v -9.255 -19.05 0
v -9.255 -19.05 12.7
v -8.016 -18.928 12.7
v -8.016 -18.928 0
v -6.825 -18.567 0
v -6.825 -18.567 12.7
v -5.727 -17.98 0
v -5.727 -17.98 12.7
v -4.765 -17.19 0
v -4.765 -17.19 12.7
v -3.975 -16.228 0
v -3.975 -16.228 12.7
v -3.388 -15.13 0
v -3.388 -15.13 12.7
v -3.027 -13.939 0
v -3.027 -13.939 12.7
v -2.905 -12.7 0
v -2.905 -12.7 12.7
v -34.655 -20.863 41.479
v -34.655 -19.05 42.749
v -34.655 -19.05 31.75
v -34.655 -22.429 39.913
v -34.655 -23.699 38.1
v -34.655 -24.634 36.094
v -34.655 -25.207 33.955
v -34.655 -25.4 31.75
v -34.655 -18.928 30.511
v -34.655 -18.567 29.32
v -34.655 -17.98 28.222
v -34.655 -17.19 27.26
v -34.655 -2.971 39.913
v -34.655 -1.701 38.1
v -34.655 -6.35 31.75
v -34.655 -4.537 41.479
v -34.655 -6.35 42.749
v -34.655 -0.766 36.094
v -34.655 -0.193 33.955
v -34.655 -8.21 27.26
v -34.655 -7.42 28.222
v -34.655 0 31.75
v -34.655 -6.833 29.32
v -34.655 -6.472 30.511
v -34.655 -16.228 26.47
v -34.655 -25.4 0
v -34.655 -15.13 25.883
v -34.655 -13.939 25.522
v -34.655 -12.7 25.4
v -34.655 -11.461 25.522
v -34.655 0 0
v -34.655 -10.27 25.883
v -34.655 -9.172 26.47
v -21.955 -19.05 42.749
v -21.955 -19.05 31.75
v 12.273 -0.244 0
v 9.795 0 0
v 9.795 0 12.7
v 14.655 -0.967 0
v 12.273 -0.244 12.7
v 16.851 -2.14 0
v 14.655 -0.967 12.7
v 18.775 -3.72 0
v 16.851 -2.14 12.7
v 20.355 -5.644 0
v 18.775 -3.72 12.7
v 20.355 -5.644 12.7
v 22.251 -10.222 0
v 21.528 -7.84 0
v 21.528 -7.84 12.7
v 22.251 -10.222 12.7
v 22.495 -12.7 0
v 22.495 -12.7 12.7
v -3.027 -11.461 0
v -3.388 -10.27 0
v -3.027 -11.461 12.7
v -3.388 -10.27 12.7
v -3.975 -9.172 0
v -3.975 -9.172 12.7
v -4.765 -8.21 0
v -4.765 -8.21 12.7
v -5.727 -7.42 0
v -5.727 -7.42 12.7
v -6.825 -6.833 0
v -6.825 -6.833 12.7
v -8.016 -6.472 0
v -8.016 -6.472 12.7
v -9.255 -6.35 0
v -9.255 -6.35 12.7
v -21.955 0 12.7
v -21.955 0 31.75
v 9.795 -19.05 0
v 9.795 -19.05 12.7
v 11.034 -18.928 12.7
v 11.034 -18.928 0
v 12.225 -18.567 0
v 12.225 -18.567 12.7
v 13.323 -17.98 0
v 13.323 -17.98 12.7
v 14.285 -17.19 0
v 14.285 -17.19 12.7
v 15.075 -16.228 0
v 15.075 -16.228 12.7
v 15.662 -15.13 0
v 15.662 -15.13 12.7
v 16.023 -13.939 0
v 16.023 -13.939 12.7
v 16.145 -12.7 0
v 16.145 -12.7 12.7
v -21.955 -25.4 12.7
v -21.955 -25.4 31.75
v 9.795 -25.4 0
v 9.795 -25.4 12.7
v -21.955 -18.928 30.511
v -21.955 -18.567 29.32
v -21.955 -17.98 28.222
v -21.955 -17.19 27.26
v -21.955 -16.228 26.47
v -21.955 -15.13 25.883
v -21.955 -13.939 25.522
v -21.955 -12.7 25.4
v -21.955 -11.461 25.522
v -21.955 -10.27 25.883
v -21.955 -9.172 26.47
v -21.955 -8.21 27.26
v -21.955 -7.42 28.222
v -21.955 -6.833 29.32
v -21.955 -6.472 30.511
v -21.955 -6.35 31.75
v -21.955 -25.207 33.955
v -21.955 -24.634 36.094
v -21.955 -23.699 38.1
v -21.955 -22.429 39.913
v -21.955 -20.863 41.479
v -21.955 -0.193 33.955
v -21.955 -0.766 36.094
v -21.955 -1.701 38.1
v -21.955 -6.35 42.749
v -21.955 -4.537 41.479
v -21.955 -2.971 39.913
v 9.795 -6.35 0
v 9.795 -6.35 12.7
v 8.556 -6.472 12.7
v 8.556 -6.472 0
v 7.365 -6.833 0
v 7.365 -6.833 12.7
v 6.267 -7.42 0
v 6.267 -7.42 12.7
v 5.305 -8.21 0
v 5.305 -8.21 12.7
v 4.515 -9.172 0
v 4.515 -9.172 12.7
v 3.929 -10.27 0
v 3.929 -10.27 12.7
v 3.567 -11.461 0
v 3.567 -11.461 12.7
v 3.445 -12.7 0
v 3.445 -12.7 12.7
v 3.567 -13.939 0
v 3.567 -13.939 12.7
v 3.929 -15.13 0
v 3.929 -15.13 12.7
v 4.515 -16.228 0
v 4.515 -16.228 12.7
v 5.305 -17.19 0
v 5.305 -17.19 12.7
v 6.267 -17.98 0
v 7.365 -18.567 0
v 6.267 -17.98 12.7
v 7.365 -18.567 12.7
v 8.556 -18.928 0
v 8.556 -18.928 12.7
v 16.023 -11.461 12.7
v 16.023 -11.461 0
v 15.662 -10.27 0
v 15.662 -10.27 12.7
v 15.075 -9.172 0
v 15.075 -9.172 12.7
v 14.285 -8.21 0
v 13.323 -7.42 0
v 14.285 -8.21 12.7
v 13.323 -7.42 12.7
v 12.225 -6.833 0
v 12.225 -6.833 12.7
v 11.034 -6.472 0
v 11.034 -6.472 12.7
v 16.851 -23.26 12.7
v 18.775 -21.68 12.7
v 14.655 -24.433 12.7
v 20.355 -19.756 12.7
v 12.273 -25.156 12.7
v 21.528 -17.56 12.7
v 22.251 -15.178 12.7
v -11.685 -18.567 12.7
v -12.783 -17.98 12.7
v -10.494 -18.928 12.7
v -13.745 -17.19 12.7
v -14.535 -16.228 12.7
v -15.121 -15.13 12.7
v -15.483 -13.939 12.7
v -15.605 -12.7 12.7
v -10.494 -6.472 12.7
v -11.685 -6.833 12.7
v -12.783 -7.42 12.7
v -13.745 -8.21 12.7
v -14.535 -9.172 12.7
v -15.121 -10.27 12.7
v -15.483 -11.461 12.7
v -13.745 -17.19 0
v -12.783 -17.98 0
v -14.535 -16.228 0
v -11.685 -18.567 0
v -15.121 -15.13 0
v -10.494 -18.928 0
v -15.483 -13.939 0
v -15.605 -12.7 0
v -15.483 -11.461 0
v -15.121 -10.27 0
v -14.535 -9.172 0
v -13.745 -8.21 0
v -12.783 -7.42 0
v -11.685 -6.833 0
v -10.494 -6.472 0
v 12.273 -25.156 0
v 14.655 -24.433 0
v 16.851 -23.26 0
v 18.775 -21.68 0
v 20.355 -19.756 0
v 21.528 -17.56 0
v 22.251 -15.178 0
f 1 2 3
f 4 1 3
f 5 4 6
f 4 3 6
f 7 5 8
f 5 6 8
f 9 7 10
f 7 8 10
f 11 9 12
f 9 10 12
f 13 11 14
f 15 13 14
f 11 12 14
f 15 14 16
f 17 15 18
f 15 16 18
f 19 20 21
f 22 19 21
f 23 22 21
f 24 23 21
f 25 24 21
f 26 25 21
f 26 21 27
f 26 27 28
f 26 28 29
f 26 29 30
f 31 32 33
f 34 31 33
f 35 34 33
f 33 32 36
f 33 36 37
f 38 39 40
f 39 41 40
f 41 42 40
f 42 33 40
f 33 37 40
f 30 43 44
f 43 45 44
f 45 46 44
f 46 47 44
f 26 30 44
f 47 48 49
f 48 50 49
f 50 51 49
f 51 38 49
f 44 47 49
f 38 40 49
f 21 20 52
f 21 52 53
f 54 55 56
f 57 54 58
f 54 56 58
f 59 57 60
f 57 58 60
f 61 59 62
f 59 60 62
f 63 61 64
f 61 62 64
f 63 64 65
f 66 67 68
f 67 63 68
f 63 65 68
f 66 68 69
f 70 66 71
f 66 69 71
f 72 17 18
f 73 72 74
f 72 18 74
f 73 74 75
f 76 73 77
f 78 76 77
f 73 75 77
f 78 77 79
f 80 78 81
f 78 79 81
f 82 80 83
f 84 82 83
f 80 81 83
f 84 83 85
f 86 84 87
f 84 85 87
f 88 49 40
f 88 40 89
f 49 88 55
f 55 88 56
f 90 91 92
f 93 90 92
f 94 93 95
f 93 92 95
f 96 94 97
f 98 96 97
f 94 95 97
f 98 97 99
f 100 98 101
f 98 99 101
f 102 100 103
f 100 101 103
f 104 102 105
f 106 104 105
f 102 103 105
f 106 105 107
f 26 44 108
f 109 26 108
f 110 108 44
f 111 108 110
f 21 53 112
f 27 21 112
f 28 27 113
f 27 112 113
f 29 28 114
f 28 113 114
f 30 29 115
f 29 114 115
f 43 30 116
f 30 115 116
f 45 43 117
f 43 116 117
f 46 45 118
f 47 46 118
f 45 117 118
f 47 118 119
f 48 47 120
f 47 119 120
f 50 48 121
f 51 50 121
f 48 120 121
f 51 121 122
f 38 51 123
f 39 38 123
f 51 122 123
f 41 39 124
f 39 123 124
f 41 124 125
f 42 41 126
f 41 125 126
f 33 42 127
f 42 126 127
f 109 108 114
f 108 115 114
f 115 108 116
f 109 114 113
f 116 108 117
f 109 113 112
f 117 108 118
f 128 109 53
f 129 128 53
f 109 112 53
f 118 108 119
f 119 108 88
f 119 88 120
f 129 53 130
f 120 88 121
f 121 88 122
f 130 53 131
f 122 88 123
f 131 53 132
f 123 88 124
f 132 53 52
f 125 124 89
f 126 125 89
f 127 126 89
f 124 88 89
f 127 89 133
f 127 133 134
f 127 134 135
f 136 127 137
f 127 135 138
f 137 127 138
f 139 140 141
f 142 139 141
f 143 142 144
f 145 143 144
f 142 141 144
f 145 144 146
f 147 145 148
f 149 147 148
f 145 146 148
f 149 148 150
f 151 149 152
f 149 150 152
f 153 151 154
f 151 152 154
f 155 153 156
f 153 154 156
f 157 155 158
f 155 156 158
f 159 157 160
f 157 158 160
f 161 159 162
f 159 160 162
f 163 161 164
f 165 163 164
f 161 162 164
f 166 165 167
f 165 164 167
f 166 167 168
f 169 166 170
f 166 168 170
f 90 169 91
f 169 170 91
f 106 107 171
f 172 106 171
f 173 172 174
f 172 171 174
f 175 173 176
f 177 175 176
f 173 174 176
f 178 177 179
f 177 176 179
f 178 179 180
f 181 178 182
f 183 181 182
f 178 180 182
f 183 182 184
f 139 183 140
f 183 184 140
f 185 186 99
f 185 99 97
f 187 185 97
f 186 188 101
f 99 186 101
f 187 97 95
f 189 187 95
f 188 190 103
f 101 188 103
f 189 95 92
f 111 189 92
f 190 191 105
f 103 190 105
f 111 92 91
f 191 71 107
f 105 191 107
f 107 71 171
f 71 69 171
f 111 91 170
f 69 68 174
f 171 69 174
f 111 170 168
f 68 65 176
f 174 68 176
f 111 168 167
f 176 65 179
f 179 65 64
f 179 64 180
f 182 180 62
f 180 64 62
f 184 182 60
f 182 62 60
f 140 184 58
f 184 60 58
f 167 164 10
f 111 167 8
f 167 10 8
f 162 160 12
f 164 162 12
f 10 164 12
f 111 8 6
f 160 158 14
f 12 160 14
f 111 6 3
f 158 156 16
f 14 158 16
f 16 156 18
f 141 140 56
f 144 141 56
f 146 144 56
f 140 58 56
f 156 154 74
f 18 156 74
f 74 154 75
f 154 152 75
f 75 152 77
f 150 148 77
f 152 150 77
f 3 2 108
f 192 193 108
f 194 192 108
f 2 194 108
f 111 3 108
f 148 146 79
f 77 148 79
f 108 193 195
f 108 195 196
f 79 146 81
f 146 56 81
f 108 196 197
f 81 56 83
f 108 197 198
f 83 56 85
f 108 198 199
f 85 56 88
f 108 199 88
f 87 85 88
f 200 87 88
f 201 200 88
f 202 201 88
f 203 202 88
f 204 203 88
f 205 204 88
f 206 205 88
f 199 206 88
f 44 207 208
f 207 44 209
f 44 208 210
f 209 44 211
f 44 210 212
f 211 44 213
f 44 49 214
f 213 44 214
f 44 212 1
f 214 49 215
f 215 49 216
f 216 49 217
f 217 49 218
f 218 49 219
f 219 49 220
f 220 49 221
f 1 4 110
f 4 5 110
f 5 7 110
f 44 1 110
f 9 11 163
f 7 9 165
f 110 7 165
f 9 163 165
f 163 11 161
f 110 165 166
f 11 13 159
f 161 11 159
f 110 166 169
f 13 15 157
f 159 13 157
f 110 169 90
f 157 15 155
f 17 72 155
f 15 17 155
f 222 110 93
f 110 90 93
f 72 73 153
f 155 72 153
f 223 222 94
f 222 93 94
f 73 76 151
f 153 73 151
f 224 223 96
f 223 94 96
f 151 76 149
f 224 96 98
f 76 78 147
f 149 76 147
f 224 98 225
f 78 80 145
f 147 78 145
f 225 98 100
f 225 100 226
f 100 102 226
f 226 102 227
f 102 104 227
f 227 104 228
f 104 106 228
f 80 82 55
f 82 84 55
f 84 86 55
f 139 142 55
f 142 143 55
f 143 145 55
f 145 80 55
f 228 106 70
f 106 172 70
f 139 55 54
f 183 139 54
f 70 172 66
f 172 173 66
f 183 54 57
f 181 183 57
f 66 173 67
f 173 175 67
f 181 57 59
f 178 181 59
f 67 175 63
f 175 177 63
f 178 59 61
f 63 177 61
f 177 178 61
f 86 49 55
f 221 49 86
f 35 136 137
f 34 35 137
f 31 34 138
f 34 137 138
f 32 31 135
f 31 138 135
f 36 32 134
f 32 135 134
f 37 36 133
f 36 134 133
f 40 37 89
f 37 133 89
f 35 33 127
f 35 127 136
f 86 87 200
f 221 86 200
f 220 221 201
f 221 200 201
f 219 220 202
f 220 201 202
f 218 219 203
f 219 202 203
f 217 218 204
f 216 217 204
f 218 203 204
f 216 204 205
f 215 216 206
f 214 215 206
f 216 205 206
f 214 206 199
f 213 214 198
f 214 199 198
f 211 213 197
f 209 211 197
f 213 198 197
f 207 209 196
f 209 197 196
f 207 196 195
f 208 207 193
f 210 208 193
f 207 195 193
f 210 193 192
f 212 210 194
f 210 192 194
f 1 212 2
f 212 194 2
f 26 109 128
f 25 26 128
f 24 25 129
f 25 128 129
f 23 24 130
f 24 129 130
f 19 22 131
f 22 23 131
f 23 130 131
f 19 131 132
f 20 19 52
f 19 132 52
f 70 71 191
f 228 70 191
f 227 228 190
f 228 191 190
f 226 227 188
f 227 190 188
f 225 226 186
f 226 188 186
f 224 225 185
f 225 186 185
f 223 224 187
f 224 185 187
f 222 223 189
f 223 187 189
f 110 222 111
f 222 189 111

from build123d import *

# Parameters (mm, degrees)
F1_DEPTH = 25.4
F3_DEPTH = 12.701
F5_DEPTH = 12.701


with BuildPart() as f1:
    # F0 (on Front) → F1 (new body)
    with BuildSketch(Plane.XZ):
        Polygon((-34.6547834919, 44.45), (-34.6547834919, 0), (22.4952165081, 0), (22.4952165081, 12.7), (-21.9547834919, 12.7), (-21.9547834919, 44.45), align=None)
    extrude(amount=F1_DEPTH)

    # F2 (on face) → F3 (cut, through all)
    with BuildSketch(Plane.XY.offset(12.7)):
        with BuildLine():
            ThreePointArc((-2.9047834919, -12.7), (-4.7646554313, -8.2098719395), (-9.2547834919, -6.35))
            Line((-9.2547834919, -6.35), (-9.2547834919, -19.05))
            ThreePointArc((-9.2547834919, -19.05), (-4.7646554313, -17.1901280605), (-2.9047834919, -12.7))
        make_face()
        with BuildLine():
            Line((-9.2547834919, -19.05), (-9.2547834919, -6.35))
            ThreePointArc((-9.2547834919, -6.35), (-15.6047834919, -12.7), (-9.2547834919, -19.05))
        make_face()
        with BuildLine():
            Line((9.7952165081, -19.05), (9.7952165081, -6.35))
            ThreePointArc((9.7952165081, -6.35), (3.4452165081, -12.7), (9.7952165081, -19.05))
        make_face()
        with BuildLine():
            ThreePointArc((16.1452165081, -12.7), (14.2853445687, -8.2098719395), (9.7952165081, -6.35))
            Line((9.7952165081, -6.35), (9.7952165081, -19.05))
            ThreePointArc((9.7952165081, -19.05), (14.2853445687, -17.1901280605), (16.1452165081, -12.7))
        make_face()
        with BuildLine():
            Line((22.4952165081, 0), (9.7952165081, 0))
            ThreePointArc((9.7952165081, 0), (18.7754726014, -3.7197438511), (22.4952165081, -12.6999999213))
            Line((22.4952165081, -12.6999999213), (22.4952165081, 0))
        make_face()
        with BuildLine():
            Line((22.4952165081, -25.4), (22.4952165081, -12.6999999213))
            ThreePointArc((22.4952165081, -12.6999999213), (18.775472657, -21.6802560932), (9.7952165081, -25.4))
            Line((9.7952165081, -25.4), (22.4952165081, -25.4))
        make_face()
    extrude(amount=-F3_DEPTH, mode=Mode.SUBTRACT)

    # F4 (on face) → F5 (cut, through all)
    with BuildSketch(Plane.YZ.offset(-21.9547834919)):
        with BuildLine():
            Line((-19.05, 42.7485226281), (-19.05, 31.75))
            ThreePointArc((-19.05, 31.75), (-12.7, 38.1), (-6.35, 31.75))
            Line((-6.35, 31.75), (-6.35, 42.7485226281))
            ThreePointArc((-6.35, 42.7485226281), (-9.4129981272, 44.0172579939), (-12.7, 44.45))
            ThreePointArc((-12.7, 44.45), (-15.9870018728, 44.0172579939), (-19.05, 42.7485226281))
        make_face()
        with BuildLine():
            Line((-25.4, 44.45), (-25.4, 31.75))
            ThreePointArc((-25.4, 31.75), (-23.6985226281, 38.1), (-19.05, 42.7485226281))
            ThreePointArc((-19.05, 42.7485226281), (-15.9870018728, 44.0172579939), (-12.7, 44.45))
            Line((-12.7, 44.45), (-25.4, 44.45))
        make_face()
        with BuildLine():
            Line((0, 44.45), (-12.7, 44.45))
            ThreePointArc((-12.7, 44.45), (-9.4129981272, 44.0172579939), (-6.35, 42.7485226281))
            ThreePointArc((-6.35, 42.7485226281), (-1.7014773719, 38.1), (0, 31.75))
            Line((0, 31.75), (0, 44.45))
        make_face()
        with BuildLine():
            ThreePointArc((-6.35, 31.75), (-12.7, 38.1), (-19.05, 31.75))
            Line((-19.05, 31.75), (-6.35, 31.75))
        make_face()
        with BuildLine():
            Line((-6.35, 31.75), (-19.05, 31.75))
            ThreePointArc((-19.05, 31.75), (-12.7, 25.4), (-6.35, 31.75))
        make_face()
    extrude(amount=-F5_DEPTH, mode=Mode.SUBTRACT)


solid = f1.part
